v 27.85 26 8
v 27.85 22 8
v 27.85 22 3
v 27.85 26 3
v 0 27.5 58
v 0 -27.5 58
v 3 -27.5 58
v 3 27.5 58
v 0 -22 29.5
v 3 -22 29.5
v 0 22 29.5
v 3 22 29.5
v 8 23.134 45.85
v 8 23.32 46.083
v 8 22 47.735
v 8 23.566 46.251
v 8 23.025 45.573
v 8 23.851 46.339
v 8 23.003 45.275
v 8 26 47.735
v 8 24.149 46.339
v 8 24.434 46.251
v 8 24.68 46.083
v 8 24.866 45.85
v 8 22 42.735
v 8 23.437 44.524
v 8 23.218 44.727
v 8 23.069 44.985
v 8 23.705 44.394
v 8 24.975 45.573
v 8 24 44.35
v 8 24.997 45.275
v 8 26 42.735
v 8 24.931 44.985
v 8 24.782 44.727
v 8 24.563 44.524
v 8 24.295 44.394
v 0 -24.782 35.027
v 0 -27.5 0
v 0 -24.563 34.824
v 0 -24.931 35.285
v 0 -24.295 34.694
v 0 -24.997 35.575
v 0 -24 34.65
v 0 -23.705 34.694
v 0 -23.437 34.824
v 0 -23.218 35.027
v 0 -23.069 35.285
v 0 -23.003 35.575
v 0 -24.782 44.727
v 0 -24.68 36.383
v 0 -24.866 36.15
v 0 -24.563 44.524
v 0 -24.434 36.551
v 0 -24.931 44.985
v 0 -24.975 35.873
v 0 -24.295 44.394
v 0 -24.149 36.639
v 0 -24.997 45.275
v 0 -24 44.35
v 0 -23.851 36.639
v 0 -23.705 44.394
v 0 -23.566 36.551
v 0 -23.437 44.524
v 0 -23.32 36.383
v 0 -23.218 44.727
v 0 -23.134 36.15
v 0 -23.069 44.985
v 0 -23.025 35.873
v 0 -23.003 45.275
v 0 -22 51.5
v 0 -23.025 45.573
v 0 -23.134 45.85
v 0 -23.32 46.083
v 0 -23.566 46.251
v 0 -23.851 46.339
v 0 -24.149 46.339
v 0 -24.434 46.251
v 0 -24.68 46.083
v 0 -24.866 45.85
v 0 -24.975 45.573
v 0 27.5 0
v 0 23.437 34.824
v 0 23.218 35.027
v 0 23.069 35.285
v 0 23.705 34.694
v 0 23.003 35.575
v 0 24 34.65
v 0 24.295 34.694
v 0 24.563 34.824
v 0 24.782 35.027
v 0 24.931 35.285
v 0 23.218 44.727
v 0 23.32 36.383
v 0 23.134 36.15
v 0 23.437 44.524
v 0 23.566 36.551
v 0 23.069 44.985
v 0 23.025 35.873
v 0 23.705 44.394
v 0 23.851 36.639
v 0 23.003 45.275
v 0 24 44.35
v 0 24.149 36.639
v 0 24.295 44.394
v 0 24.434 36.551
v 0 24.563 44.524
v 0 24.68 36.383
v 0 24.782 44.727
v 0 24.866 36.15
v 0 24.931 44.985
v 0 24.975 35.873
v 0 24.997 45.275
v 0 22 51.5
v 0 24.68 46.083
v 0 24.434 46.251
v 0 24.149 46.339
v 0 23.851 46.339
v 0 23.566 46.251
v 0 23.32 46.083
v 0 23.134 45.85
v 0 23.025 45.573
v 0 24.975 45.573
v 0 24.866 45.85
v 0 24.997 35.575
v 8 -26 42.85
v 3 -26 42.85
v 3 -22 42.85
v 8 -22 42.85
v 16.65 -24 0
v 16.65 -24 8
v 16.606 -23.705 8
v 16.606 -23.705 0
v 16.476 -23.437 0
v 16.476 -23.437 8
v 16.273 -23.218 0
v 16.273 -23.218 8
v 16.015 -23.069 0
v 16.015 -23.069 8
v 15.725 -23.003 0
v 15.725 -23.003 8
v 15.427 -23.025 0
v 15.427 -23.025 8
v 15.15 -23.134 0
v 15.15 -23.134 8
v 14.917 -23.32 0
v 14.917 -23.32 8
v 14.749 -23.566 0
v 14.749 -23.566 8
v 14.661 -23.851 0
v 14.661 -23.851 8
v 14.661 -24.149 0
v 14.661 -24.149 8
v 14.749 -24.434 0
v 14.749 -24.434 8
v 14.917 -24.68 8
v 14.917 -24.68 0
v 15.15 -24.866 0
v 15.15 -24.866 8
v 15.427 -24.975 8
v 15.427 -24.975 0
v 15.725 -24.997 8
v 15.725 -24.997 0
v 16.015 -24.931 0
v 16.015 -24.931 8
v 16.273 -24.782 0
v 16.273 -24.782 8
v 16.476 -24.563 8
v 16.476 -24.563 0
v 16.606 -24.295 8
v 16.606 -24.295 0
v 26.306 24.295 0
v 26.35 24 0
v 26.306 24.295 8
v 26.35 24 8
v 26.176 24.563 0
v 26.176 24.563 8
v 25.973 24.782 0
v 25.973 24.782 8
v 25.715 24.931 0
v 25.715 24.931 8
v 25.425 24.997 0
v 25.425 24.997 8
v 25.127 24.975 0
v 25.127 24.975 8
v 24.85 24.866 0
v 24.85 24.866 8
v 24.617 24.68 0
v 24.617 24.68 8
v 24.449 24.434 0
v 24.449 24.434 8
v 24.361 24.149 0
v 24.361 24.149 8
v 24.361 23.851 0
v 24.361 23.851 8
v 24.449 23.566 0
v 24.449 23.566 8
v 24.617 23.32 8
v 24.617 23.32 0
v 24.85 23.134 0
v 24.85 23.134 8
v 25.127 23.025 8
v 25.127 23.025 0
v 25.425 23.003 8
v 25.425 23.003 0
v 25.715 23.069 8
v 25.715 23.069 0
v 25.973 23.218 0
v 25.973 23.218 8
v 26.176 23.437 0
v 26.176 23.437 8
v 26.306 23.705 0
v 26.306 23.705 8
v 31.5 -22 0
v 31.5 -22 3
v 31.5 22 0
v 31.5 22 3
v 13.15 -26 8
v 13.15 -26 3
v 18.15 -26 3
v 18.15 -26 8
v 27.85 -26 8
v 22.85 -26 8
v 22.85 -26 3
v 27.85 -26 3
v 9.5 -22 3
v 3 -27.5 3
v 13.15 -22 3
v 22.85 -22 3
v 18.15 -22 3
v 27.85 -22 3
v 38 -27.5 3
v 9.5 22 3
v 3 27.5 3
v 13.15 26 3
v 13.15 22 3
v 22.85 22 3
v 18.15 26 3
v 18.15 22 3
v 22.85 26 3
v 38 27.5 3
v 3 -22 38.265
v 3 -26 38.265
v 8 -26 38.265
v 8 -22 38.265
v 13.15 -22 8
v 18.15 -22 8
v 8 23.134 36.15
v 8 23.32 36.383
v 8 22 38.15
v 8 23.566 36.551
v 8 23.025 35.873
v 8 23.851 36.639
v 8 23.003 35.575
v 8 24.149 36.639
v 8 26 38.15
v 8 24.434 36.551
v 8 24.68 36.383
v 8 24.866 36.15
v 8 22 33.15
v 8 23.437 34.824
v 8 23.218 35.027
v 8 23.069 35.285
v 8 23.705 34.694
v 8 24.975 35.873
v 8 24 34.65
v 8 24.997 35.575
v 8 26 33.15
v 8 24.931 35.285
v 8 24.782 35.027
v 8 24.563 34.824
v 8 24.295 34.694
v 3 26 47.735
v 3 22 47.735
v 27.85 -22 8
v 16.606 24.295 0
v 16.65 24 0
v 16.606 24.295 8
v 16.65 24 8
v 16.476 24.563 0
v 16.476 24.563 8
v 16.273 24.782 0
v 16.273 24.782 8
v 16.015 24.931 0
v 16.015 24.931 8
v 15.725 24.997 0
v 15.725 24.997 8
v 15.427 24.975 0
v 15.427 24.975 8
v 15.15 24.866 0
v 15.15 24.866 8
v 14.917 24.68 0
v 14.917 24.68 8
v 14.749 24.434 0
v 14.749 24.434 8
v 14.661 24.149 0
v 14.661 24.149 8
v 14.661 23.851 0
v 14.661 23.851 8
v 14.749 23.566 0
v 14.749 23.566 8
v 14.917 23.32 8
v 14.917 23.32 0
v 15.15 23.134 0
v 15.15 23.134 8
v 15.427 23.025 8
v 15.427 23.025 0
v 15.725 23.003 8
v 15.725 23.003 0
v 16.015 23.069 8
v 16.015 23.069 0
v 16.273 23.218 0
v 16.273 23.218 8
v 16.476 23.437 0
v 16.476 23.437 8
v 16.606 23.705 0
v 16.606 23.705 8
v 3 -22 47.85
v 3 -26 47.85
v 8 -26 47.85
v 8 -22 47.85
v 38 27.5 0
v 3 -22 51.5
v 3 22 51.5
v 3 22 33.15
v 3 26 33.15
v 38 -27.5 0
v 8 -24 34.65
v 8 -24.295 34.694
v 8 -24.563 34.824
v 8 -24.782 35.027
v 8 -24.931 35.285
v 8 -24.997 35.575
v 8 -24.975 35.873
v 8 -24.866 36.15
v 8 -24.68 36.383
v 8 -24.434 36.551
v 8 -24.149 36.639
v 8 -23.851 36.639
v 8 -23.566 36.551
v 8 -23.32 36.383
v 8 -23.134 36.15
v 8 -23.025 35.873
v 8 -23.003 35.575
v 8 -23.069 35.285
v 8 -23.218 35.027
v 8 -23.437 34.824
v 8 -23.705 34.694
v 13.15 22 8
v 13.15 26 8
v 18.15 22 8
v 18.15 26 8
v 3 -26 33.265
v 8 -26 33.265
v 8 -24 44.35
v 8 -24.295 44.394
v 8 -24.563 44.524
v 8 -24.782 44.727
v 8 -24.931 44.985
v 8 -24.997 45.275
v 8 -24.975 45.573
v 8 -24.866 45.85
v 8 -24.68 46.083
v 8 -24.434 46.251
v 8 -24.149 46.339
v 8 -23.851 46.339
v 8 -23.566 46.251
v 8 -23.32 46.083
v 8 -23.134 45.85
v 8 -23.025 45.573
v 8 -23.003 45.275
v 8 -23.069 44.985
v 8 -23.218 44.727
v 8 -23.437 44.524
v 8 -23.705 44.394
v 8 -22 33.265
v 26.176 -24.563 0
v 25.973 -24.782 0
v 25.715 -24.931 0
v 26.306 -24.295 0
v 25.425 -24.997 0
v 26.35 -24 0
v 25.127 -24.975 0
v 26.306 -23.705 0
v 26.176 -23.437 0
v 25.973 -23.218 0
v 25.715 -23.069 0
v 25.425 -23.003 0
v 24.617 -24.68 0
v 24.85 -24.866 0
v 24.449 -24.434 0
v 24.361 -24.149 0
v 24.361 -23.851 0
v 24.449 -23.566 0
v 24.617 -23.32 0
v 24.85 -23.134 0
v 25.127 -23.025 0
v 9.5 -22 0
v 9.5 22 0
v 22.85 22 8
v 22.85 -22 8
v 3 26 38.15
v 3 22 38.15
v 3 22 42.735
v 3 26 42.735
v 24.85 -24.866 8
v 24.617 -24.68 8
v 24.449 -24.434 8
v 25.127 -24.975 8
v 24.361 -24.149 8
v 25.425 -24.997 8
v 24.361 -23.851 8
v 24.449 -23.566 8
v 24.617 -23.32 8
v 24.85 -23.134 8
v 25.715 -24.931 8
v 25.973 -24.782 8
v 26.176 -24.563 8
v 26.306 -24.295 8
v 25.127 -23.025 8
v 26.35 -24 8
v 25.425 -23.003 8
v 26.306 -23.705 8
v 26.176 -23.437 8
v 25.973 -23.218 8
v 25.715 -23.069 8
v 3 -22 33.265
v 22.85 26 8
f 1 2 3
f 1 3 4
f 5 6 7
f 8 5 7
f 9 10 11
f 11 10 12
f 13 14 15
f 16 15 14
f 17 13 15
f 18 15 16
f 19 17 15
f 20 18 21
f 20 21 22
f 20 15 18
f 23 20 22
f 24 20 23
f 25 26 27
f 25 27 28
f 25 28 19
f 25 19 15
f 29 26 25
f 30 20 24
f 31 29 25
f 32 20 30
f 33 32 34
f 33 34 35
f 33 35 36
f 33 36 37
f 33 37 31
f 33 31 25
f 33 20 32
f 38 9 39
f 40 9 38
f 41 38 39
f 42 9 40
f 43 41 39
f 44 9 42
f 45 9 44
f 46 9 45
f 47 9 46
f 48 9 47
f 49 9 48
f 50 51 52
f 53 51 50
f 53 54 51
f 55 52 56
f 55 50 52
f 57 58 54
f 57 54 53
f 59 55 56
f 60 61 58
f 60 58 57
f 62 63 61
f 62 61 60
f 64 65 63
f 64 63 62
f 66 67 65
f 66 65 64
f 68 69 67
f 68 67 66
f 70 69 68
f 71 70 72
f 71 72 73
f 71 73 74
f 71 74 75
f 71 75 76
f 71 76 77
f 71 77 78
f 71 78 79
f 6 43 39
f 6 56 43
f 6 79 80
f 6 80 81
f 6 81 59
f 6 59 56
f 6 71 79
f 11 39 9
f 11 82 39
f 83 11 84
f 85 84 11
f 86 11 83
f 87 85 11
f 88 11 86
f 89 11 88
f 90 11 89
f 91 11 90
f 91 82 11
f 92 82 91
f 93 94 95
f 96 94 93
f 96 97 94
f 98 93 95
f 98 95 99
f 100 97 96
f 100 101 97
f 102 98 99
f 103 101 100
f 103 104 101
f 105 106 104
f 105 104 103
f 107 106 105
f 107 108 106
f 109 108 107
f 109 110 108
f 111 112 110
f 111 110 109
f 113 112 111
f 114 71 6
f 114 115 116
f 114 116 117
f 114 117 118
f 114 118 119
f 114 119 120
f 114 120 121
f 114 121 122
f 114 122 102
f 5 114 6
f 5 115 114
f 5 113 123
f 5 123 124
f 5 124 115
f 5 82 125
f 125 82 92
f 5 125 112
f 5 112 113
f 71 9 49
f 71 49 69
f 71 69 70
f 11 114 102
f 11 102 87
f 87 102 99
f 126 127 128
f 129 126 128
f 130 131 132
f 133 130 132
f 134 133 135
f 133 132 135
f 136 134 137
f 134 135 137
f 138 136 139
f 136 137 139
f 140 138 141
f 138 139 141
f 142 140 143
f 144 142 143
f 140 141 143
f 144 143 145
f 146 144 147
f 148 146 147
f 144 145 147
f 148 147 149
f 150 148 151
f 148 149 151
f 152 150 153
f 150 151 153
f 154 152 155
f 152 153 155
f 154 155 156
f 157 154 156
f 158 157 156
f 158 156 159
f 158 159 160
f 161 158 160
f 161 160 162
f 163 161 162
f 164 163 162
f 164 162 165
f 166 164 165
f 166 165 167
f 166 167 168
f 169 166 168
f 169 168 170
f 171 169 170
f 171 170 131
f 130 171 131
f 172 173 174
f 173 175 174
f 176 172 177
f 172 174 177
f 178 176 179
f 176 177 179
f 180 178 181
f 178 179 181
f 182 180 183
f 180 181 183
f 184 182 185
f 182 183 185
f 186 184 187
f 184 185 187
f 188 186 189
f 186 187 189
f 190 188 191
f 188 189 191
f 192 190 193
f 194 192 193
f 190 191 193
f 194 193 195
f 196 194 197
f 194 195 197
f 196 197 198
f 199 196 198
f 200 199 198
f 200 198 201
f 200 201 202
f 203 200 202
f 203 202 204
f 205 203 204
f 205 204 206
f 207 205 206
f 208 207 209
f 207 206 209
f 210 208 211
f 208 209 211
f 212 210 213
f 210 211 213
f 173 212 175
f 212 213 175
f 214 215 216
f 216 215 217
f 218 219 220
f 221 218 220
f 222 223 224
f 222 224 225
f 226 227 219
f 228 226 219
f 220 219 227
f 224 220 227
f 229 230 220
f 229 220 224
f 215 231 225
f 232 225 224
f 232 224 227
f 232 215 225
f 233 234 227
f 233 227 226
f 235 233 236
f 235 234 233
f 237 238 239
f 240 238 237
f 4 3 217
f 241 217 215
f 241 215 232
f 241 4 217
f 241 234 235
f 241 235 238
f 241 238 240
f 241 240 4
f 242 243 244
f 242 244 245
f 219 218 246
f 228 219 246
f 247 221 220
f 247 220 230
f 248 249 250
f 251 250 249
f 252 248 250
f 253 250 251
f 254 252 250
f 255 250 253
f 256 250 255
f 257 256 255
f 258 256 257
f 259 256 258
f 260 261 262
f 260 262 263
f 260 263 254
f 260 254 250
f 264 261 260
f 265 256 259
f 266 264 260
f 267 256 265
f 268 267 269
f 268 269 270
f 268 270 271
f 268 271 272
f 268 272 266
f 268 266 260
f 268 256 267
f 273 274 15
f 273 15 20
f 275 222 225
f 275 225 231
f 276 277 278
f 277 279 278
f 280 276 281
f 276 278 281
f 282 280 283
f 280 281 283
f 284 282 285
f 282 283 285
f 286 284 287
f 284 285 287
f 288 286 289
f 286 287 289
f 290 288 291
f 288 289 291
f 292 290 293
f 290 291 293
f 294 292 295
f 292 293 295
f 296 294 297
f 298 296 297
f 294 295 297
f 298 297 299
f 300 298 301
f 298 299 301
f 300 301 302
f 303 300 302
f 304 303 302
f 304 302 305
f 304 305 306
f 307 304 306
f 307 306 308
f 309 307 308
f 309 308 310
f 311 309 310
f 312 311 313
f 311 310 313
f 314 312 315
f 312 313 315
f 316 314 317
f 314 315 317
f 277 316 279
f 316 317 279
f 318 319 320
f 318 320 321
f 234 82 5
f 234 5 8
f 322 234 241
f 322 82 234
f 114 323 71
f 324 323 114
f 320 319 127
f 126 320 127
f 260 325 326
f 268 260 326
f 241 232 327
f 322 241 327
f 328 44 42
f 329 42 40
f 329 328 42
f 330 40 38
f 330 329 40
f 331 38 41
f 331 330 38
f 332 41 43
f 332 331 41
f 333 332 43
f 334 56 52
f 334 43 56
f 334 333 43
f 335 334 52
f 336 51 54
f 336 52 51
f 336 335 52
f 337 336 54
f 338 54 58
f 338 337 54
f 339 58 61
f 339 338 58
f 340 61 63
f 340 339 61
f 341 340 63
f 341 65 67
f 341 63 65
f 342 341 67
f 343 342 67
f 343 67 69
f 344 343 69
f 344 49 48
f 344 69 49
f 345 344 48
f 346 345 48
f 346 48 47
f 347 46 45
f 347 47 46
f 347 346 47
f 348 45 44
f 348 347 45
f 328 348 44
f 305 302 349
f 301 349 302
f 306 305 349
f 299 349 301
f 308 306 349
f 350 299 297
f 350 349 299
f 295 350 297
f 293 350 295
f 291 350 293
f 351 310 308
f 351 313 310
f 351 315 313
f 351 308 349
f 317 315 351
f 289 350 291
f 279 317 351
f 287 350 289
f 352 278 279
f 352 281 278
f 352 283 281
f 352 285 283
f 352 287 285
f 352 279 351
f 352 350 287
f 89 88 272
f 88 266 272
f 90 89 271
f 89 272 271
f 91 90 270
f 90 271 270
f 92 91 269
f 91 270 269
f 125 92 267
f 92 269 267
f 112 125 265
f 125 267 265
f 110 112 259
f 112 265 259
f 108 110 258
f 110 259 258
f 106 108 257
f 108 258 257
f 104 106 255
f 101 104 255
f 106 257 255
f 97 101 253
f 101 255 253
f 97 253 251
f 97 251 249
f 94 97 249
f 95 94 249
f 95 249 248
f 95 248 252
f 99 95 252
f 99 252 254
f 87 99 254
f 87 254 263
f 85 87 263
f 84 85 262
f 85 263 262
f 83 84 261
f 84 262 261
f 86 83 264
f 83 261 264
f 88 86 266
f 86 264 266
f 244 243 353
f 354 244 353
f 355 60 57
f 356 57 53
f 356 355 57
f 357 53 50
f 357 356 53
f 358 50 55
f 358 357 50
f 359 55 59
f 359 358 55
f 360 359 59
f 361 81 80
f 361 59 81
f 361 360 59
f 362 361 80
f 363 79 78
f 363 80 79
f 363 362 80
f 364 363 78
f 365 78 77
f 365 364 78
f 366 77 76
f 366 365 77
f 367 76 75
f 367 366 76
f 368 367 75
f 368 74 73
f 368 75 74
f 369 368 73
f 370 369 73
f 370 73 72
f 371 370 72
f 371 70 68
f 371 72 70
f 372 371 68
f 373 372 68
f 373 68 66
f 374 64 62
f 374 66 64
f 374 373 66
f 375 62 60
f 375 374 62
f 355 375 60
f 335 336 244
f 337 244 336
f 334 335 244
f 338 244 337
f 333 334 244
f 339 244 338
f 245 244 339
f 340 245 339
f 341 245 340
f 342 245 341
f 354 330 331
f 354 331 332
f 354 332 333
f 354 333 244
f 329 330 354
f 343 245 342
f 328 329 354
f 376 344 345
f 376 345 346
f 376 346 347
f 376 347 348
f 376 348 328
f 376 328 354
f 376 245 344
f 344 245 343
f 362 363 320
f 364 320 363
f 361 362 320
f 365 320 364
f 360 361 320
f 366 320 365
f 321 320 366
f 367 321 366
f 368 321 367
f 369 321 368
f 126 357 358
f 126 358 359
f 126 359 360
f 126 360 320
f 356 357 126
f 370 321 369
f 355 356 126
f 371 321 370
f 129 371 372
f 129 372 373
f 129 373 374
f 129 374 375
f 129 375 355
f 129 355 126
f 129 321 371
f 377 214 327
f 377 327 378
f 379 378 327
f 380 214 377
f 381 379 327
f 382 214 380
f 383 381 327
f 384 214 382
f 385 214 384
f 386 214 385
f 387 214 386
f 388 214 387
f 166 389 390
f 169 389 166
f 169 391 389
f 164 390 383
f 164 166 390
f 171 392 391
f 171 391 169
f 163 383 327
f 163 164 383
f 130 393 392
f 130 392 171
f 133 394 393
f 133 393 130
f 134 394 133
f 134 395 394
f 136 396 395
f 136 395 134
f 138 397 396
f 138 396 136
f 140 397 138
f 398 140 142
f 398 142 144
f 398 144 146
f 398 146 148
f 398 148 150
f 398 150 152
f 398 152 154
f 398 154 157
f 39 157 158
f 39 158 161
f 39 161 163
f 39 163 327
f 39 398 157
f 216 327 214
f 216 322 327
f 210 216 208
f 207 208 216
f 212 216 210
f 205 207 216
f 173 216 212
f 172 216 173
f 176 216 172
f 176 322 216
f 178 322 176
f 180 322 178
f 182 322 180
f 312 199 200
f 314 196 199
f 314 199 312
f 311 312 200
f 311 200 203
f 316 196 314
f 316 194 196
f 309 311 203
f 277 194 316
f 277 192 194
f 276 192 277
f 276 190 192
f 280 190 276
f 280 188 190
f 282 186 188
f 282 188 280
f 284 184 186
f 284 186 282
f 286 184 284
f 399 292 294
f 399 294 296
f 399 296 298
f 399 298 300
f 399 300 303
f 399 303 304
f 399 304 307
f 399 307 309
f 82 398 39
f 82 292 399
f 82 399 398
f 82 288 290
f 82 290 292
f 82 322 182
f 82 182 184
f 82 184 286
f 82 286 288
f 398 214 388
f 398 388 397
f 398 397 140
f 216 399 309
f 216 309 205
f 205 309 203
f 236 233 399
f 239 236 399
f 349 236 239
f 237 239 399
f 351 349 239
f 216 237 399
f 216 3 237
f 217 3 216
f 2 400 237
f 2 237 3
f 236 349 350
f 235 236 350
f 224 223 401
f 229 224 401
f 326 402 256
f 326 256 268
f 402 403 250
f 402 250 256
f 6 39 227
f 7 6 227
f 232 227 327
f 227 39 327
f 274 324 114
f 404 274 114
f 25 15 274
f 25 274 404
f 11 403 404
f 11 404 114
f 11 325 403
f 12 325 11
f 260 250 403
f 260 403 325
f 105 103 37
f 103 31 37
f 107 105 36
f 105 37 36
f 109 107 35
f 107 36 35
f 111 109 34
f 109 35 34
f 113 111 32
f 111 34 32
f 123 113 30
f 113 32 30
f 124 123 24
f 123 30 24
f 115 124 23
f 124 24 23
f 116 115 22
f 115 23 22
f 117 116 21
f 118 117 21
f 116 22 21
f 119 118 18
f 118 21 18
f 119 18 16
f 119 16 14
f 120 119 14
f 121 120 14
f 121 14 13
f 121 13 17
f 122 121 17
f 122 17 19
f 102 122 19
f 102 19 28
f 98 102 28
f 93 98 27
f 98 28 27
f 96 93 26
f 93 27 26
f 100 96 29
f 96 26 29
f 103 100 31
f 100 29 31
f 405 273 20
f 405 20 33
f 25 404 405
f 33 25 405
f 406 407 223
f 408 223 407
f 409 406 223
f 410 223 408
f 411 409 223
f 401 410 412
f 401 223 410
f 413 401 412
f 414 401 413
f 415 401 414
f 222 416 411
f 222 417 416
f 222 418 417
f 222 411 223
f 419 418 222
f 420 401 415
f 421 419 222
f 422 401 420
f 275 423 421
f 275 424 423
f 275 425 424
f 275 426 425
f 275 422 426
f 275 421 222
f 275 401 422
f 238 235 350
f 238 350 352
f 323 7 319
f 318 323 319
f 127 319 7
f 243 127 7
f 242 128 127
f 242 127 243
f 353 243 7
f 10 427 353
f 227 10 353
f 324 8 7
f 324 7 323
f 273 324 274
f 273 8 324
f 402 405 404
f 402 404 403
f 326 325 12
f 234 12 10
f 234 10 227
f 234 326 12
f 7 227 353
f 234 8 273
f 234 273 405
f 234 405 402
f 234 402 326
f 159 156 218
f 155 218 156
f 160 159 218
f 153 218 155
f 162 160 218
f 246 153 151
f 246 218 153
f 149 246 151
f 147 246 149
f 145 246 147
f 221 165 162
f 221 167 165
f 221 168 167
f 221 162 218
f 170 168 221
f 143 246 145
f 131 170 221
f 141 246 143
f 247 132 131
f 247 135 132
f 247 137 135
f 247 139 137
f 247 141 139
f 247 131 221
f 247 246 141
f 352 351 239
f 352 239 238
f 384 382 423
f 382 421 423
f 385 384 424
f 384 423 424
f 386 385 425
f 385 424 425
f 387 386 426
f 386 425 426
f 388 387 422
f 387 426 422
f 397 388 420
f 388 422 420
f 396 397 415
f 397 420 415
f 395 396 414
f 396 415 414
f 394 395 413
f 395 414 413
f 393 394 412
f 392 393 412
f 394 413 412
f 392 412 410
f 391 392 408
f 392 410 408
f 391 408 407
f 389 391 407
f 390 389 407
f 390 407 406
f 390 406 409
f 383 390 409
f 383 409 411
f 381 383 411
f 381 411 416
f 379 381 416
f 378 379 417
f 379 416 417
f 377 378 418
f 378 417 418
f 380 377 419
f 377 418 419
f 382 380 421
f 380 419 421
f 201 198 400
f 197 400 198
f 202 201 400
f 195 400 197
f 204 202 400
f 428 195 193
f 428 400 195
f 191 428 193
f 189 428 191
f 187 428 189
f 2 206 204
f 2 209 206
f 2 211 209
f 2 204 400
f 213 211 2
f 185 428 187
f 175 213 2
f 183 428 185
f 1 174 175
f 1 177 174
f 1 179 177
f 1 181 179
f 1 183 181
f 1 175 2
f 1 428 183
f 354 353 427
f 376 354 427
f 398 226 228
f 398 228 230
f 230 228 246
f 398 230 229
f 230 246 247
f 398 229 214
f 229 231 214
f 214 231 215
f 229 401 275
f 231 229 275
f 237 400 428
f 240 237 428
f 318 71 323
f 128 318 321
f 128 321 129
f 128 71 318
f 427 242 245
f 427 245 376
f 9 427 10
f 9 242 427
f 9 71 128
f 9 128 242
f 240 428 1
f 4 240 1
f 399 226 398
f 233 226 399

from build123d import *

# Parameters (mm, degrees)
BOSS_EXTRUDE1_DEPTH = 27.5
SKETCH3_R           = 1
SKETCH3_W           = 22
SKETCH3_H           = 44
CUT_EXTRUDE1_DEPTH  = 3
SKETCH4_R           = 1
SKETCH4_W           = 22
SKETCH4_H           = 44
CUT_EXTRUDE2_DEPTH  = 3
SKETCH5_W           = 5
SKETCH5_H           = 4
BOSS_EXTRUDE2_DEPTH = 5
CUT_EXTRUDE3_START  = -5
SKETCH6_R           = 1
CUT_EXTRUDE3_DEPTH  = 5
BOSS_EXTRUDE3_START = 5
SKETCH7_W           = 5
SKETCH7_H           = 4
SKETCH7_R           = 1
BOSS_EXTRUDE3_DEPTH = 5


with BuildPart() as part:
    # Sketch1 → Boss-Extrude1 (new, symmetric)
    with BuildSketch(Plane(origin=(0, 0, 0), x_dir=(1, 0, 0), z_dir=(0, 1, 0))):
        Polygon((38, 0), (0, 0), (0, -58), (3, -58), (3, -3), (38, -3), align=None)
    extrude(amount=BOSS_EXTRUDE1_DEPTH, both=True)

    # Sketch3 → Cut-Extrude1 (cut)
    with BuildSketch(Plane.XY.offset(3)):
        with Locations((15.65, -24)):
            Circle(SKETCH3_R)
        with Locations((25.35, -24)):
            Circle(SKETCH3_R)
        with Locations((25.35, 24)):
            Circle(SKETCH3_R)
        with Locations((15.65, 24)):
            Circle(SKETCH3_R)
        with Locations((20.5, 0)):
            Rectangle(SKETCH3_W, SKETCH3_H)
    extrude(amount=-CUT_EXTRUDE1_DEPTH, mode=Mode.SUBTRACT)

    # Sketch4 → Cut-Extrude2 (cut)
    with BuildSketch(Plane(origin=(3, 0, 0), x_dir=(0, 0, -1), z_dir=(1, 0, 0))):
        with Locations((-45.35, -24)):
            Circle(SKETCH4_R)
        with Locations((-35.65, -24)):
            Circle(SKETCH4_R)
        with Locations((-35.65, 24)):
            Circle(SKETCH4_R)
        with Locations((-45.35, 24)):
            Circle(SKETCH4_R)
        with Locations((-40.5, 0)):
            Rectangle(SKETCH4_W, SKETCH4_H)
    extrude(amount=-CUT_EXTRUDE2_DEPTH, mode=Mode.SUBTRACT)

    # Sketch5 → Boss-Extrude2 (add)
    with BuildSketch(Plane(origin=(3, 0, 0), x_dir=(0, 0, -1), z_dir=(1, 0, 0))):
        with Locations((-45.35, -24)):
            Rectangle(SKETCH5_W, SKETCH5_H)
        with Locations((-35.765327537, -24)):
            Rectangle(SKETCH5_W, SKETCH5_H)
        with Locations((-35.65, 24)):
            Rectangle(SKETCH5_W, SKETCH5_H)
        with Locations((-45.234672463, 24)):
            Rectangle(SKETCH5_W, SKETCH5_H)
    extrude(amount=BOSS_EXTRUDE2_DEPTH)

    # Sketch6 → Cut-Extrude3 (cut)
    with BuildSketch(Plane.ZY.offset(-3).offset(CUT_EXTRUDE3_START)):
        with Locations(Location((35.65, -24, 0), (0, 0, 180))):
            Circle(SKETCH6_R)
        with Locations(Location((45.35, -24, 0), (0, 0, 180))):
            Circle(SKETCH6_R)
        with Locations(Location((45.35, 24, 0), (0, 0, 180))):
            Circle(SKETCH6_R)
        with Locations(Location((35.65, 24, 0), (0, 0, 180))):
            Circle(SKETCH6_R)
    extrude(amount=CUT_EXTRUDE3_DEPTH, mode=Mode.SUBTRACT)

    # Sketch7 → Boss-Extrude3 (add)
    # profile 1 of 4: a face of its own
    with BuildSketch(Plane.XY.offset(3).offset(BOSS_EXTRUDE3_START)):
        with Locations((15.65, -24)):
            Rectangle(SKETCH7_W, SKETCH7_H)
        with Locations((15.65, -24)):
            Circle(SKETCH7_R, mode=Mode.SUBTRACT)
    # profile 2 of 4: a face of its own
    with BuildSketch(Plane.XY.offset(3).offset(BOSS_EXTRUDE3_START)):
        with Locations((25.35, -24)):
            Rectangle(SKETCH7_W, SKETCH7_H)
        with Locations((25.35, -24)):
            Circle(SKETCH7_R, mode=Mode.SUBTRACT)
    # profile 3 of 4: a face of its own
    with BuildSketch(Plane.XY.offset(3).offset(BOSS_EXTRUDE3_START)):
        with Locations((25.35, 24)):
            Rectangle(SKETCH7_W, SKETCH7_H)
        with Locations((25.35, 24)):
            Circle(SKETCH7_R, mode=Mode.SUBTRACT)
    # profile 4 of 4: a face of its own
    with BuildSketch(Plane.XY.offset(3).offset(BOSS_EXTRUDE3_START)):
        with Locations((15.65, 24)):
            Rectangle(SKETCH7_W, SKETCH7_H)
        with Locations((15.65, 24)):
            Circle(SKETCH7_R, mode=Mode.SUBTRACT)
    extrude(amount=-BOSS_EXTRUDE3_DEPTH)


solid = part.part
